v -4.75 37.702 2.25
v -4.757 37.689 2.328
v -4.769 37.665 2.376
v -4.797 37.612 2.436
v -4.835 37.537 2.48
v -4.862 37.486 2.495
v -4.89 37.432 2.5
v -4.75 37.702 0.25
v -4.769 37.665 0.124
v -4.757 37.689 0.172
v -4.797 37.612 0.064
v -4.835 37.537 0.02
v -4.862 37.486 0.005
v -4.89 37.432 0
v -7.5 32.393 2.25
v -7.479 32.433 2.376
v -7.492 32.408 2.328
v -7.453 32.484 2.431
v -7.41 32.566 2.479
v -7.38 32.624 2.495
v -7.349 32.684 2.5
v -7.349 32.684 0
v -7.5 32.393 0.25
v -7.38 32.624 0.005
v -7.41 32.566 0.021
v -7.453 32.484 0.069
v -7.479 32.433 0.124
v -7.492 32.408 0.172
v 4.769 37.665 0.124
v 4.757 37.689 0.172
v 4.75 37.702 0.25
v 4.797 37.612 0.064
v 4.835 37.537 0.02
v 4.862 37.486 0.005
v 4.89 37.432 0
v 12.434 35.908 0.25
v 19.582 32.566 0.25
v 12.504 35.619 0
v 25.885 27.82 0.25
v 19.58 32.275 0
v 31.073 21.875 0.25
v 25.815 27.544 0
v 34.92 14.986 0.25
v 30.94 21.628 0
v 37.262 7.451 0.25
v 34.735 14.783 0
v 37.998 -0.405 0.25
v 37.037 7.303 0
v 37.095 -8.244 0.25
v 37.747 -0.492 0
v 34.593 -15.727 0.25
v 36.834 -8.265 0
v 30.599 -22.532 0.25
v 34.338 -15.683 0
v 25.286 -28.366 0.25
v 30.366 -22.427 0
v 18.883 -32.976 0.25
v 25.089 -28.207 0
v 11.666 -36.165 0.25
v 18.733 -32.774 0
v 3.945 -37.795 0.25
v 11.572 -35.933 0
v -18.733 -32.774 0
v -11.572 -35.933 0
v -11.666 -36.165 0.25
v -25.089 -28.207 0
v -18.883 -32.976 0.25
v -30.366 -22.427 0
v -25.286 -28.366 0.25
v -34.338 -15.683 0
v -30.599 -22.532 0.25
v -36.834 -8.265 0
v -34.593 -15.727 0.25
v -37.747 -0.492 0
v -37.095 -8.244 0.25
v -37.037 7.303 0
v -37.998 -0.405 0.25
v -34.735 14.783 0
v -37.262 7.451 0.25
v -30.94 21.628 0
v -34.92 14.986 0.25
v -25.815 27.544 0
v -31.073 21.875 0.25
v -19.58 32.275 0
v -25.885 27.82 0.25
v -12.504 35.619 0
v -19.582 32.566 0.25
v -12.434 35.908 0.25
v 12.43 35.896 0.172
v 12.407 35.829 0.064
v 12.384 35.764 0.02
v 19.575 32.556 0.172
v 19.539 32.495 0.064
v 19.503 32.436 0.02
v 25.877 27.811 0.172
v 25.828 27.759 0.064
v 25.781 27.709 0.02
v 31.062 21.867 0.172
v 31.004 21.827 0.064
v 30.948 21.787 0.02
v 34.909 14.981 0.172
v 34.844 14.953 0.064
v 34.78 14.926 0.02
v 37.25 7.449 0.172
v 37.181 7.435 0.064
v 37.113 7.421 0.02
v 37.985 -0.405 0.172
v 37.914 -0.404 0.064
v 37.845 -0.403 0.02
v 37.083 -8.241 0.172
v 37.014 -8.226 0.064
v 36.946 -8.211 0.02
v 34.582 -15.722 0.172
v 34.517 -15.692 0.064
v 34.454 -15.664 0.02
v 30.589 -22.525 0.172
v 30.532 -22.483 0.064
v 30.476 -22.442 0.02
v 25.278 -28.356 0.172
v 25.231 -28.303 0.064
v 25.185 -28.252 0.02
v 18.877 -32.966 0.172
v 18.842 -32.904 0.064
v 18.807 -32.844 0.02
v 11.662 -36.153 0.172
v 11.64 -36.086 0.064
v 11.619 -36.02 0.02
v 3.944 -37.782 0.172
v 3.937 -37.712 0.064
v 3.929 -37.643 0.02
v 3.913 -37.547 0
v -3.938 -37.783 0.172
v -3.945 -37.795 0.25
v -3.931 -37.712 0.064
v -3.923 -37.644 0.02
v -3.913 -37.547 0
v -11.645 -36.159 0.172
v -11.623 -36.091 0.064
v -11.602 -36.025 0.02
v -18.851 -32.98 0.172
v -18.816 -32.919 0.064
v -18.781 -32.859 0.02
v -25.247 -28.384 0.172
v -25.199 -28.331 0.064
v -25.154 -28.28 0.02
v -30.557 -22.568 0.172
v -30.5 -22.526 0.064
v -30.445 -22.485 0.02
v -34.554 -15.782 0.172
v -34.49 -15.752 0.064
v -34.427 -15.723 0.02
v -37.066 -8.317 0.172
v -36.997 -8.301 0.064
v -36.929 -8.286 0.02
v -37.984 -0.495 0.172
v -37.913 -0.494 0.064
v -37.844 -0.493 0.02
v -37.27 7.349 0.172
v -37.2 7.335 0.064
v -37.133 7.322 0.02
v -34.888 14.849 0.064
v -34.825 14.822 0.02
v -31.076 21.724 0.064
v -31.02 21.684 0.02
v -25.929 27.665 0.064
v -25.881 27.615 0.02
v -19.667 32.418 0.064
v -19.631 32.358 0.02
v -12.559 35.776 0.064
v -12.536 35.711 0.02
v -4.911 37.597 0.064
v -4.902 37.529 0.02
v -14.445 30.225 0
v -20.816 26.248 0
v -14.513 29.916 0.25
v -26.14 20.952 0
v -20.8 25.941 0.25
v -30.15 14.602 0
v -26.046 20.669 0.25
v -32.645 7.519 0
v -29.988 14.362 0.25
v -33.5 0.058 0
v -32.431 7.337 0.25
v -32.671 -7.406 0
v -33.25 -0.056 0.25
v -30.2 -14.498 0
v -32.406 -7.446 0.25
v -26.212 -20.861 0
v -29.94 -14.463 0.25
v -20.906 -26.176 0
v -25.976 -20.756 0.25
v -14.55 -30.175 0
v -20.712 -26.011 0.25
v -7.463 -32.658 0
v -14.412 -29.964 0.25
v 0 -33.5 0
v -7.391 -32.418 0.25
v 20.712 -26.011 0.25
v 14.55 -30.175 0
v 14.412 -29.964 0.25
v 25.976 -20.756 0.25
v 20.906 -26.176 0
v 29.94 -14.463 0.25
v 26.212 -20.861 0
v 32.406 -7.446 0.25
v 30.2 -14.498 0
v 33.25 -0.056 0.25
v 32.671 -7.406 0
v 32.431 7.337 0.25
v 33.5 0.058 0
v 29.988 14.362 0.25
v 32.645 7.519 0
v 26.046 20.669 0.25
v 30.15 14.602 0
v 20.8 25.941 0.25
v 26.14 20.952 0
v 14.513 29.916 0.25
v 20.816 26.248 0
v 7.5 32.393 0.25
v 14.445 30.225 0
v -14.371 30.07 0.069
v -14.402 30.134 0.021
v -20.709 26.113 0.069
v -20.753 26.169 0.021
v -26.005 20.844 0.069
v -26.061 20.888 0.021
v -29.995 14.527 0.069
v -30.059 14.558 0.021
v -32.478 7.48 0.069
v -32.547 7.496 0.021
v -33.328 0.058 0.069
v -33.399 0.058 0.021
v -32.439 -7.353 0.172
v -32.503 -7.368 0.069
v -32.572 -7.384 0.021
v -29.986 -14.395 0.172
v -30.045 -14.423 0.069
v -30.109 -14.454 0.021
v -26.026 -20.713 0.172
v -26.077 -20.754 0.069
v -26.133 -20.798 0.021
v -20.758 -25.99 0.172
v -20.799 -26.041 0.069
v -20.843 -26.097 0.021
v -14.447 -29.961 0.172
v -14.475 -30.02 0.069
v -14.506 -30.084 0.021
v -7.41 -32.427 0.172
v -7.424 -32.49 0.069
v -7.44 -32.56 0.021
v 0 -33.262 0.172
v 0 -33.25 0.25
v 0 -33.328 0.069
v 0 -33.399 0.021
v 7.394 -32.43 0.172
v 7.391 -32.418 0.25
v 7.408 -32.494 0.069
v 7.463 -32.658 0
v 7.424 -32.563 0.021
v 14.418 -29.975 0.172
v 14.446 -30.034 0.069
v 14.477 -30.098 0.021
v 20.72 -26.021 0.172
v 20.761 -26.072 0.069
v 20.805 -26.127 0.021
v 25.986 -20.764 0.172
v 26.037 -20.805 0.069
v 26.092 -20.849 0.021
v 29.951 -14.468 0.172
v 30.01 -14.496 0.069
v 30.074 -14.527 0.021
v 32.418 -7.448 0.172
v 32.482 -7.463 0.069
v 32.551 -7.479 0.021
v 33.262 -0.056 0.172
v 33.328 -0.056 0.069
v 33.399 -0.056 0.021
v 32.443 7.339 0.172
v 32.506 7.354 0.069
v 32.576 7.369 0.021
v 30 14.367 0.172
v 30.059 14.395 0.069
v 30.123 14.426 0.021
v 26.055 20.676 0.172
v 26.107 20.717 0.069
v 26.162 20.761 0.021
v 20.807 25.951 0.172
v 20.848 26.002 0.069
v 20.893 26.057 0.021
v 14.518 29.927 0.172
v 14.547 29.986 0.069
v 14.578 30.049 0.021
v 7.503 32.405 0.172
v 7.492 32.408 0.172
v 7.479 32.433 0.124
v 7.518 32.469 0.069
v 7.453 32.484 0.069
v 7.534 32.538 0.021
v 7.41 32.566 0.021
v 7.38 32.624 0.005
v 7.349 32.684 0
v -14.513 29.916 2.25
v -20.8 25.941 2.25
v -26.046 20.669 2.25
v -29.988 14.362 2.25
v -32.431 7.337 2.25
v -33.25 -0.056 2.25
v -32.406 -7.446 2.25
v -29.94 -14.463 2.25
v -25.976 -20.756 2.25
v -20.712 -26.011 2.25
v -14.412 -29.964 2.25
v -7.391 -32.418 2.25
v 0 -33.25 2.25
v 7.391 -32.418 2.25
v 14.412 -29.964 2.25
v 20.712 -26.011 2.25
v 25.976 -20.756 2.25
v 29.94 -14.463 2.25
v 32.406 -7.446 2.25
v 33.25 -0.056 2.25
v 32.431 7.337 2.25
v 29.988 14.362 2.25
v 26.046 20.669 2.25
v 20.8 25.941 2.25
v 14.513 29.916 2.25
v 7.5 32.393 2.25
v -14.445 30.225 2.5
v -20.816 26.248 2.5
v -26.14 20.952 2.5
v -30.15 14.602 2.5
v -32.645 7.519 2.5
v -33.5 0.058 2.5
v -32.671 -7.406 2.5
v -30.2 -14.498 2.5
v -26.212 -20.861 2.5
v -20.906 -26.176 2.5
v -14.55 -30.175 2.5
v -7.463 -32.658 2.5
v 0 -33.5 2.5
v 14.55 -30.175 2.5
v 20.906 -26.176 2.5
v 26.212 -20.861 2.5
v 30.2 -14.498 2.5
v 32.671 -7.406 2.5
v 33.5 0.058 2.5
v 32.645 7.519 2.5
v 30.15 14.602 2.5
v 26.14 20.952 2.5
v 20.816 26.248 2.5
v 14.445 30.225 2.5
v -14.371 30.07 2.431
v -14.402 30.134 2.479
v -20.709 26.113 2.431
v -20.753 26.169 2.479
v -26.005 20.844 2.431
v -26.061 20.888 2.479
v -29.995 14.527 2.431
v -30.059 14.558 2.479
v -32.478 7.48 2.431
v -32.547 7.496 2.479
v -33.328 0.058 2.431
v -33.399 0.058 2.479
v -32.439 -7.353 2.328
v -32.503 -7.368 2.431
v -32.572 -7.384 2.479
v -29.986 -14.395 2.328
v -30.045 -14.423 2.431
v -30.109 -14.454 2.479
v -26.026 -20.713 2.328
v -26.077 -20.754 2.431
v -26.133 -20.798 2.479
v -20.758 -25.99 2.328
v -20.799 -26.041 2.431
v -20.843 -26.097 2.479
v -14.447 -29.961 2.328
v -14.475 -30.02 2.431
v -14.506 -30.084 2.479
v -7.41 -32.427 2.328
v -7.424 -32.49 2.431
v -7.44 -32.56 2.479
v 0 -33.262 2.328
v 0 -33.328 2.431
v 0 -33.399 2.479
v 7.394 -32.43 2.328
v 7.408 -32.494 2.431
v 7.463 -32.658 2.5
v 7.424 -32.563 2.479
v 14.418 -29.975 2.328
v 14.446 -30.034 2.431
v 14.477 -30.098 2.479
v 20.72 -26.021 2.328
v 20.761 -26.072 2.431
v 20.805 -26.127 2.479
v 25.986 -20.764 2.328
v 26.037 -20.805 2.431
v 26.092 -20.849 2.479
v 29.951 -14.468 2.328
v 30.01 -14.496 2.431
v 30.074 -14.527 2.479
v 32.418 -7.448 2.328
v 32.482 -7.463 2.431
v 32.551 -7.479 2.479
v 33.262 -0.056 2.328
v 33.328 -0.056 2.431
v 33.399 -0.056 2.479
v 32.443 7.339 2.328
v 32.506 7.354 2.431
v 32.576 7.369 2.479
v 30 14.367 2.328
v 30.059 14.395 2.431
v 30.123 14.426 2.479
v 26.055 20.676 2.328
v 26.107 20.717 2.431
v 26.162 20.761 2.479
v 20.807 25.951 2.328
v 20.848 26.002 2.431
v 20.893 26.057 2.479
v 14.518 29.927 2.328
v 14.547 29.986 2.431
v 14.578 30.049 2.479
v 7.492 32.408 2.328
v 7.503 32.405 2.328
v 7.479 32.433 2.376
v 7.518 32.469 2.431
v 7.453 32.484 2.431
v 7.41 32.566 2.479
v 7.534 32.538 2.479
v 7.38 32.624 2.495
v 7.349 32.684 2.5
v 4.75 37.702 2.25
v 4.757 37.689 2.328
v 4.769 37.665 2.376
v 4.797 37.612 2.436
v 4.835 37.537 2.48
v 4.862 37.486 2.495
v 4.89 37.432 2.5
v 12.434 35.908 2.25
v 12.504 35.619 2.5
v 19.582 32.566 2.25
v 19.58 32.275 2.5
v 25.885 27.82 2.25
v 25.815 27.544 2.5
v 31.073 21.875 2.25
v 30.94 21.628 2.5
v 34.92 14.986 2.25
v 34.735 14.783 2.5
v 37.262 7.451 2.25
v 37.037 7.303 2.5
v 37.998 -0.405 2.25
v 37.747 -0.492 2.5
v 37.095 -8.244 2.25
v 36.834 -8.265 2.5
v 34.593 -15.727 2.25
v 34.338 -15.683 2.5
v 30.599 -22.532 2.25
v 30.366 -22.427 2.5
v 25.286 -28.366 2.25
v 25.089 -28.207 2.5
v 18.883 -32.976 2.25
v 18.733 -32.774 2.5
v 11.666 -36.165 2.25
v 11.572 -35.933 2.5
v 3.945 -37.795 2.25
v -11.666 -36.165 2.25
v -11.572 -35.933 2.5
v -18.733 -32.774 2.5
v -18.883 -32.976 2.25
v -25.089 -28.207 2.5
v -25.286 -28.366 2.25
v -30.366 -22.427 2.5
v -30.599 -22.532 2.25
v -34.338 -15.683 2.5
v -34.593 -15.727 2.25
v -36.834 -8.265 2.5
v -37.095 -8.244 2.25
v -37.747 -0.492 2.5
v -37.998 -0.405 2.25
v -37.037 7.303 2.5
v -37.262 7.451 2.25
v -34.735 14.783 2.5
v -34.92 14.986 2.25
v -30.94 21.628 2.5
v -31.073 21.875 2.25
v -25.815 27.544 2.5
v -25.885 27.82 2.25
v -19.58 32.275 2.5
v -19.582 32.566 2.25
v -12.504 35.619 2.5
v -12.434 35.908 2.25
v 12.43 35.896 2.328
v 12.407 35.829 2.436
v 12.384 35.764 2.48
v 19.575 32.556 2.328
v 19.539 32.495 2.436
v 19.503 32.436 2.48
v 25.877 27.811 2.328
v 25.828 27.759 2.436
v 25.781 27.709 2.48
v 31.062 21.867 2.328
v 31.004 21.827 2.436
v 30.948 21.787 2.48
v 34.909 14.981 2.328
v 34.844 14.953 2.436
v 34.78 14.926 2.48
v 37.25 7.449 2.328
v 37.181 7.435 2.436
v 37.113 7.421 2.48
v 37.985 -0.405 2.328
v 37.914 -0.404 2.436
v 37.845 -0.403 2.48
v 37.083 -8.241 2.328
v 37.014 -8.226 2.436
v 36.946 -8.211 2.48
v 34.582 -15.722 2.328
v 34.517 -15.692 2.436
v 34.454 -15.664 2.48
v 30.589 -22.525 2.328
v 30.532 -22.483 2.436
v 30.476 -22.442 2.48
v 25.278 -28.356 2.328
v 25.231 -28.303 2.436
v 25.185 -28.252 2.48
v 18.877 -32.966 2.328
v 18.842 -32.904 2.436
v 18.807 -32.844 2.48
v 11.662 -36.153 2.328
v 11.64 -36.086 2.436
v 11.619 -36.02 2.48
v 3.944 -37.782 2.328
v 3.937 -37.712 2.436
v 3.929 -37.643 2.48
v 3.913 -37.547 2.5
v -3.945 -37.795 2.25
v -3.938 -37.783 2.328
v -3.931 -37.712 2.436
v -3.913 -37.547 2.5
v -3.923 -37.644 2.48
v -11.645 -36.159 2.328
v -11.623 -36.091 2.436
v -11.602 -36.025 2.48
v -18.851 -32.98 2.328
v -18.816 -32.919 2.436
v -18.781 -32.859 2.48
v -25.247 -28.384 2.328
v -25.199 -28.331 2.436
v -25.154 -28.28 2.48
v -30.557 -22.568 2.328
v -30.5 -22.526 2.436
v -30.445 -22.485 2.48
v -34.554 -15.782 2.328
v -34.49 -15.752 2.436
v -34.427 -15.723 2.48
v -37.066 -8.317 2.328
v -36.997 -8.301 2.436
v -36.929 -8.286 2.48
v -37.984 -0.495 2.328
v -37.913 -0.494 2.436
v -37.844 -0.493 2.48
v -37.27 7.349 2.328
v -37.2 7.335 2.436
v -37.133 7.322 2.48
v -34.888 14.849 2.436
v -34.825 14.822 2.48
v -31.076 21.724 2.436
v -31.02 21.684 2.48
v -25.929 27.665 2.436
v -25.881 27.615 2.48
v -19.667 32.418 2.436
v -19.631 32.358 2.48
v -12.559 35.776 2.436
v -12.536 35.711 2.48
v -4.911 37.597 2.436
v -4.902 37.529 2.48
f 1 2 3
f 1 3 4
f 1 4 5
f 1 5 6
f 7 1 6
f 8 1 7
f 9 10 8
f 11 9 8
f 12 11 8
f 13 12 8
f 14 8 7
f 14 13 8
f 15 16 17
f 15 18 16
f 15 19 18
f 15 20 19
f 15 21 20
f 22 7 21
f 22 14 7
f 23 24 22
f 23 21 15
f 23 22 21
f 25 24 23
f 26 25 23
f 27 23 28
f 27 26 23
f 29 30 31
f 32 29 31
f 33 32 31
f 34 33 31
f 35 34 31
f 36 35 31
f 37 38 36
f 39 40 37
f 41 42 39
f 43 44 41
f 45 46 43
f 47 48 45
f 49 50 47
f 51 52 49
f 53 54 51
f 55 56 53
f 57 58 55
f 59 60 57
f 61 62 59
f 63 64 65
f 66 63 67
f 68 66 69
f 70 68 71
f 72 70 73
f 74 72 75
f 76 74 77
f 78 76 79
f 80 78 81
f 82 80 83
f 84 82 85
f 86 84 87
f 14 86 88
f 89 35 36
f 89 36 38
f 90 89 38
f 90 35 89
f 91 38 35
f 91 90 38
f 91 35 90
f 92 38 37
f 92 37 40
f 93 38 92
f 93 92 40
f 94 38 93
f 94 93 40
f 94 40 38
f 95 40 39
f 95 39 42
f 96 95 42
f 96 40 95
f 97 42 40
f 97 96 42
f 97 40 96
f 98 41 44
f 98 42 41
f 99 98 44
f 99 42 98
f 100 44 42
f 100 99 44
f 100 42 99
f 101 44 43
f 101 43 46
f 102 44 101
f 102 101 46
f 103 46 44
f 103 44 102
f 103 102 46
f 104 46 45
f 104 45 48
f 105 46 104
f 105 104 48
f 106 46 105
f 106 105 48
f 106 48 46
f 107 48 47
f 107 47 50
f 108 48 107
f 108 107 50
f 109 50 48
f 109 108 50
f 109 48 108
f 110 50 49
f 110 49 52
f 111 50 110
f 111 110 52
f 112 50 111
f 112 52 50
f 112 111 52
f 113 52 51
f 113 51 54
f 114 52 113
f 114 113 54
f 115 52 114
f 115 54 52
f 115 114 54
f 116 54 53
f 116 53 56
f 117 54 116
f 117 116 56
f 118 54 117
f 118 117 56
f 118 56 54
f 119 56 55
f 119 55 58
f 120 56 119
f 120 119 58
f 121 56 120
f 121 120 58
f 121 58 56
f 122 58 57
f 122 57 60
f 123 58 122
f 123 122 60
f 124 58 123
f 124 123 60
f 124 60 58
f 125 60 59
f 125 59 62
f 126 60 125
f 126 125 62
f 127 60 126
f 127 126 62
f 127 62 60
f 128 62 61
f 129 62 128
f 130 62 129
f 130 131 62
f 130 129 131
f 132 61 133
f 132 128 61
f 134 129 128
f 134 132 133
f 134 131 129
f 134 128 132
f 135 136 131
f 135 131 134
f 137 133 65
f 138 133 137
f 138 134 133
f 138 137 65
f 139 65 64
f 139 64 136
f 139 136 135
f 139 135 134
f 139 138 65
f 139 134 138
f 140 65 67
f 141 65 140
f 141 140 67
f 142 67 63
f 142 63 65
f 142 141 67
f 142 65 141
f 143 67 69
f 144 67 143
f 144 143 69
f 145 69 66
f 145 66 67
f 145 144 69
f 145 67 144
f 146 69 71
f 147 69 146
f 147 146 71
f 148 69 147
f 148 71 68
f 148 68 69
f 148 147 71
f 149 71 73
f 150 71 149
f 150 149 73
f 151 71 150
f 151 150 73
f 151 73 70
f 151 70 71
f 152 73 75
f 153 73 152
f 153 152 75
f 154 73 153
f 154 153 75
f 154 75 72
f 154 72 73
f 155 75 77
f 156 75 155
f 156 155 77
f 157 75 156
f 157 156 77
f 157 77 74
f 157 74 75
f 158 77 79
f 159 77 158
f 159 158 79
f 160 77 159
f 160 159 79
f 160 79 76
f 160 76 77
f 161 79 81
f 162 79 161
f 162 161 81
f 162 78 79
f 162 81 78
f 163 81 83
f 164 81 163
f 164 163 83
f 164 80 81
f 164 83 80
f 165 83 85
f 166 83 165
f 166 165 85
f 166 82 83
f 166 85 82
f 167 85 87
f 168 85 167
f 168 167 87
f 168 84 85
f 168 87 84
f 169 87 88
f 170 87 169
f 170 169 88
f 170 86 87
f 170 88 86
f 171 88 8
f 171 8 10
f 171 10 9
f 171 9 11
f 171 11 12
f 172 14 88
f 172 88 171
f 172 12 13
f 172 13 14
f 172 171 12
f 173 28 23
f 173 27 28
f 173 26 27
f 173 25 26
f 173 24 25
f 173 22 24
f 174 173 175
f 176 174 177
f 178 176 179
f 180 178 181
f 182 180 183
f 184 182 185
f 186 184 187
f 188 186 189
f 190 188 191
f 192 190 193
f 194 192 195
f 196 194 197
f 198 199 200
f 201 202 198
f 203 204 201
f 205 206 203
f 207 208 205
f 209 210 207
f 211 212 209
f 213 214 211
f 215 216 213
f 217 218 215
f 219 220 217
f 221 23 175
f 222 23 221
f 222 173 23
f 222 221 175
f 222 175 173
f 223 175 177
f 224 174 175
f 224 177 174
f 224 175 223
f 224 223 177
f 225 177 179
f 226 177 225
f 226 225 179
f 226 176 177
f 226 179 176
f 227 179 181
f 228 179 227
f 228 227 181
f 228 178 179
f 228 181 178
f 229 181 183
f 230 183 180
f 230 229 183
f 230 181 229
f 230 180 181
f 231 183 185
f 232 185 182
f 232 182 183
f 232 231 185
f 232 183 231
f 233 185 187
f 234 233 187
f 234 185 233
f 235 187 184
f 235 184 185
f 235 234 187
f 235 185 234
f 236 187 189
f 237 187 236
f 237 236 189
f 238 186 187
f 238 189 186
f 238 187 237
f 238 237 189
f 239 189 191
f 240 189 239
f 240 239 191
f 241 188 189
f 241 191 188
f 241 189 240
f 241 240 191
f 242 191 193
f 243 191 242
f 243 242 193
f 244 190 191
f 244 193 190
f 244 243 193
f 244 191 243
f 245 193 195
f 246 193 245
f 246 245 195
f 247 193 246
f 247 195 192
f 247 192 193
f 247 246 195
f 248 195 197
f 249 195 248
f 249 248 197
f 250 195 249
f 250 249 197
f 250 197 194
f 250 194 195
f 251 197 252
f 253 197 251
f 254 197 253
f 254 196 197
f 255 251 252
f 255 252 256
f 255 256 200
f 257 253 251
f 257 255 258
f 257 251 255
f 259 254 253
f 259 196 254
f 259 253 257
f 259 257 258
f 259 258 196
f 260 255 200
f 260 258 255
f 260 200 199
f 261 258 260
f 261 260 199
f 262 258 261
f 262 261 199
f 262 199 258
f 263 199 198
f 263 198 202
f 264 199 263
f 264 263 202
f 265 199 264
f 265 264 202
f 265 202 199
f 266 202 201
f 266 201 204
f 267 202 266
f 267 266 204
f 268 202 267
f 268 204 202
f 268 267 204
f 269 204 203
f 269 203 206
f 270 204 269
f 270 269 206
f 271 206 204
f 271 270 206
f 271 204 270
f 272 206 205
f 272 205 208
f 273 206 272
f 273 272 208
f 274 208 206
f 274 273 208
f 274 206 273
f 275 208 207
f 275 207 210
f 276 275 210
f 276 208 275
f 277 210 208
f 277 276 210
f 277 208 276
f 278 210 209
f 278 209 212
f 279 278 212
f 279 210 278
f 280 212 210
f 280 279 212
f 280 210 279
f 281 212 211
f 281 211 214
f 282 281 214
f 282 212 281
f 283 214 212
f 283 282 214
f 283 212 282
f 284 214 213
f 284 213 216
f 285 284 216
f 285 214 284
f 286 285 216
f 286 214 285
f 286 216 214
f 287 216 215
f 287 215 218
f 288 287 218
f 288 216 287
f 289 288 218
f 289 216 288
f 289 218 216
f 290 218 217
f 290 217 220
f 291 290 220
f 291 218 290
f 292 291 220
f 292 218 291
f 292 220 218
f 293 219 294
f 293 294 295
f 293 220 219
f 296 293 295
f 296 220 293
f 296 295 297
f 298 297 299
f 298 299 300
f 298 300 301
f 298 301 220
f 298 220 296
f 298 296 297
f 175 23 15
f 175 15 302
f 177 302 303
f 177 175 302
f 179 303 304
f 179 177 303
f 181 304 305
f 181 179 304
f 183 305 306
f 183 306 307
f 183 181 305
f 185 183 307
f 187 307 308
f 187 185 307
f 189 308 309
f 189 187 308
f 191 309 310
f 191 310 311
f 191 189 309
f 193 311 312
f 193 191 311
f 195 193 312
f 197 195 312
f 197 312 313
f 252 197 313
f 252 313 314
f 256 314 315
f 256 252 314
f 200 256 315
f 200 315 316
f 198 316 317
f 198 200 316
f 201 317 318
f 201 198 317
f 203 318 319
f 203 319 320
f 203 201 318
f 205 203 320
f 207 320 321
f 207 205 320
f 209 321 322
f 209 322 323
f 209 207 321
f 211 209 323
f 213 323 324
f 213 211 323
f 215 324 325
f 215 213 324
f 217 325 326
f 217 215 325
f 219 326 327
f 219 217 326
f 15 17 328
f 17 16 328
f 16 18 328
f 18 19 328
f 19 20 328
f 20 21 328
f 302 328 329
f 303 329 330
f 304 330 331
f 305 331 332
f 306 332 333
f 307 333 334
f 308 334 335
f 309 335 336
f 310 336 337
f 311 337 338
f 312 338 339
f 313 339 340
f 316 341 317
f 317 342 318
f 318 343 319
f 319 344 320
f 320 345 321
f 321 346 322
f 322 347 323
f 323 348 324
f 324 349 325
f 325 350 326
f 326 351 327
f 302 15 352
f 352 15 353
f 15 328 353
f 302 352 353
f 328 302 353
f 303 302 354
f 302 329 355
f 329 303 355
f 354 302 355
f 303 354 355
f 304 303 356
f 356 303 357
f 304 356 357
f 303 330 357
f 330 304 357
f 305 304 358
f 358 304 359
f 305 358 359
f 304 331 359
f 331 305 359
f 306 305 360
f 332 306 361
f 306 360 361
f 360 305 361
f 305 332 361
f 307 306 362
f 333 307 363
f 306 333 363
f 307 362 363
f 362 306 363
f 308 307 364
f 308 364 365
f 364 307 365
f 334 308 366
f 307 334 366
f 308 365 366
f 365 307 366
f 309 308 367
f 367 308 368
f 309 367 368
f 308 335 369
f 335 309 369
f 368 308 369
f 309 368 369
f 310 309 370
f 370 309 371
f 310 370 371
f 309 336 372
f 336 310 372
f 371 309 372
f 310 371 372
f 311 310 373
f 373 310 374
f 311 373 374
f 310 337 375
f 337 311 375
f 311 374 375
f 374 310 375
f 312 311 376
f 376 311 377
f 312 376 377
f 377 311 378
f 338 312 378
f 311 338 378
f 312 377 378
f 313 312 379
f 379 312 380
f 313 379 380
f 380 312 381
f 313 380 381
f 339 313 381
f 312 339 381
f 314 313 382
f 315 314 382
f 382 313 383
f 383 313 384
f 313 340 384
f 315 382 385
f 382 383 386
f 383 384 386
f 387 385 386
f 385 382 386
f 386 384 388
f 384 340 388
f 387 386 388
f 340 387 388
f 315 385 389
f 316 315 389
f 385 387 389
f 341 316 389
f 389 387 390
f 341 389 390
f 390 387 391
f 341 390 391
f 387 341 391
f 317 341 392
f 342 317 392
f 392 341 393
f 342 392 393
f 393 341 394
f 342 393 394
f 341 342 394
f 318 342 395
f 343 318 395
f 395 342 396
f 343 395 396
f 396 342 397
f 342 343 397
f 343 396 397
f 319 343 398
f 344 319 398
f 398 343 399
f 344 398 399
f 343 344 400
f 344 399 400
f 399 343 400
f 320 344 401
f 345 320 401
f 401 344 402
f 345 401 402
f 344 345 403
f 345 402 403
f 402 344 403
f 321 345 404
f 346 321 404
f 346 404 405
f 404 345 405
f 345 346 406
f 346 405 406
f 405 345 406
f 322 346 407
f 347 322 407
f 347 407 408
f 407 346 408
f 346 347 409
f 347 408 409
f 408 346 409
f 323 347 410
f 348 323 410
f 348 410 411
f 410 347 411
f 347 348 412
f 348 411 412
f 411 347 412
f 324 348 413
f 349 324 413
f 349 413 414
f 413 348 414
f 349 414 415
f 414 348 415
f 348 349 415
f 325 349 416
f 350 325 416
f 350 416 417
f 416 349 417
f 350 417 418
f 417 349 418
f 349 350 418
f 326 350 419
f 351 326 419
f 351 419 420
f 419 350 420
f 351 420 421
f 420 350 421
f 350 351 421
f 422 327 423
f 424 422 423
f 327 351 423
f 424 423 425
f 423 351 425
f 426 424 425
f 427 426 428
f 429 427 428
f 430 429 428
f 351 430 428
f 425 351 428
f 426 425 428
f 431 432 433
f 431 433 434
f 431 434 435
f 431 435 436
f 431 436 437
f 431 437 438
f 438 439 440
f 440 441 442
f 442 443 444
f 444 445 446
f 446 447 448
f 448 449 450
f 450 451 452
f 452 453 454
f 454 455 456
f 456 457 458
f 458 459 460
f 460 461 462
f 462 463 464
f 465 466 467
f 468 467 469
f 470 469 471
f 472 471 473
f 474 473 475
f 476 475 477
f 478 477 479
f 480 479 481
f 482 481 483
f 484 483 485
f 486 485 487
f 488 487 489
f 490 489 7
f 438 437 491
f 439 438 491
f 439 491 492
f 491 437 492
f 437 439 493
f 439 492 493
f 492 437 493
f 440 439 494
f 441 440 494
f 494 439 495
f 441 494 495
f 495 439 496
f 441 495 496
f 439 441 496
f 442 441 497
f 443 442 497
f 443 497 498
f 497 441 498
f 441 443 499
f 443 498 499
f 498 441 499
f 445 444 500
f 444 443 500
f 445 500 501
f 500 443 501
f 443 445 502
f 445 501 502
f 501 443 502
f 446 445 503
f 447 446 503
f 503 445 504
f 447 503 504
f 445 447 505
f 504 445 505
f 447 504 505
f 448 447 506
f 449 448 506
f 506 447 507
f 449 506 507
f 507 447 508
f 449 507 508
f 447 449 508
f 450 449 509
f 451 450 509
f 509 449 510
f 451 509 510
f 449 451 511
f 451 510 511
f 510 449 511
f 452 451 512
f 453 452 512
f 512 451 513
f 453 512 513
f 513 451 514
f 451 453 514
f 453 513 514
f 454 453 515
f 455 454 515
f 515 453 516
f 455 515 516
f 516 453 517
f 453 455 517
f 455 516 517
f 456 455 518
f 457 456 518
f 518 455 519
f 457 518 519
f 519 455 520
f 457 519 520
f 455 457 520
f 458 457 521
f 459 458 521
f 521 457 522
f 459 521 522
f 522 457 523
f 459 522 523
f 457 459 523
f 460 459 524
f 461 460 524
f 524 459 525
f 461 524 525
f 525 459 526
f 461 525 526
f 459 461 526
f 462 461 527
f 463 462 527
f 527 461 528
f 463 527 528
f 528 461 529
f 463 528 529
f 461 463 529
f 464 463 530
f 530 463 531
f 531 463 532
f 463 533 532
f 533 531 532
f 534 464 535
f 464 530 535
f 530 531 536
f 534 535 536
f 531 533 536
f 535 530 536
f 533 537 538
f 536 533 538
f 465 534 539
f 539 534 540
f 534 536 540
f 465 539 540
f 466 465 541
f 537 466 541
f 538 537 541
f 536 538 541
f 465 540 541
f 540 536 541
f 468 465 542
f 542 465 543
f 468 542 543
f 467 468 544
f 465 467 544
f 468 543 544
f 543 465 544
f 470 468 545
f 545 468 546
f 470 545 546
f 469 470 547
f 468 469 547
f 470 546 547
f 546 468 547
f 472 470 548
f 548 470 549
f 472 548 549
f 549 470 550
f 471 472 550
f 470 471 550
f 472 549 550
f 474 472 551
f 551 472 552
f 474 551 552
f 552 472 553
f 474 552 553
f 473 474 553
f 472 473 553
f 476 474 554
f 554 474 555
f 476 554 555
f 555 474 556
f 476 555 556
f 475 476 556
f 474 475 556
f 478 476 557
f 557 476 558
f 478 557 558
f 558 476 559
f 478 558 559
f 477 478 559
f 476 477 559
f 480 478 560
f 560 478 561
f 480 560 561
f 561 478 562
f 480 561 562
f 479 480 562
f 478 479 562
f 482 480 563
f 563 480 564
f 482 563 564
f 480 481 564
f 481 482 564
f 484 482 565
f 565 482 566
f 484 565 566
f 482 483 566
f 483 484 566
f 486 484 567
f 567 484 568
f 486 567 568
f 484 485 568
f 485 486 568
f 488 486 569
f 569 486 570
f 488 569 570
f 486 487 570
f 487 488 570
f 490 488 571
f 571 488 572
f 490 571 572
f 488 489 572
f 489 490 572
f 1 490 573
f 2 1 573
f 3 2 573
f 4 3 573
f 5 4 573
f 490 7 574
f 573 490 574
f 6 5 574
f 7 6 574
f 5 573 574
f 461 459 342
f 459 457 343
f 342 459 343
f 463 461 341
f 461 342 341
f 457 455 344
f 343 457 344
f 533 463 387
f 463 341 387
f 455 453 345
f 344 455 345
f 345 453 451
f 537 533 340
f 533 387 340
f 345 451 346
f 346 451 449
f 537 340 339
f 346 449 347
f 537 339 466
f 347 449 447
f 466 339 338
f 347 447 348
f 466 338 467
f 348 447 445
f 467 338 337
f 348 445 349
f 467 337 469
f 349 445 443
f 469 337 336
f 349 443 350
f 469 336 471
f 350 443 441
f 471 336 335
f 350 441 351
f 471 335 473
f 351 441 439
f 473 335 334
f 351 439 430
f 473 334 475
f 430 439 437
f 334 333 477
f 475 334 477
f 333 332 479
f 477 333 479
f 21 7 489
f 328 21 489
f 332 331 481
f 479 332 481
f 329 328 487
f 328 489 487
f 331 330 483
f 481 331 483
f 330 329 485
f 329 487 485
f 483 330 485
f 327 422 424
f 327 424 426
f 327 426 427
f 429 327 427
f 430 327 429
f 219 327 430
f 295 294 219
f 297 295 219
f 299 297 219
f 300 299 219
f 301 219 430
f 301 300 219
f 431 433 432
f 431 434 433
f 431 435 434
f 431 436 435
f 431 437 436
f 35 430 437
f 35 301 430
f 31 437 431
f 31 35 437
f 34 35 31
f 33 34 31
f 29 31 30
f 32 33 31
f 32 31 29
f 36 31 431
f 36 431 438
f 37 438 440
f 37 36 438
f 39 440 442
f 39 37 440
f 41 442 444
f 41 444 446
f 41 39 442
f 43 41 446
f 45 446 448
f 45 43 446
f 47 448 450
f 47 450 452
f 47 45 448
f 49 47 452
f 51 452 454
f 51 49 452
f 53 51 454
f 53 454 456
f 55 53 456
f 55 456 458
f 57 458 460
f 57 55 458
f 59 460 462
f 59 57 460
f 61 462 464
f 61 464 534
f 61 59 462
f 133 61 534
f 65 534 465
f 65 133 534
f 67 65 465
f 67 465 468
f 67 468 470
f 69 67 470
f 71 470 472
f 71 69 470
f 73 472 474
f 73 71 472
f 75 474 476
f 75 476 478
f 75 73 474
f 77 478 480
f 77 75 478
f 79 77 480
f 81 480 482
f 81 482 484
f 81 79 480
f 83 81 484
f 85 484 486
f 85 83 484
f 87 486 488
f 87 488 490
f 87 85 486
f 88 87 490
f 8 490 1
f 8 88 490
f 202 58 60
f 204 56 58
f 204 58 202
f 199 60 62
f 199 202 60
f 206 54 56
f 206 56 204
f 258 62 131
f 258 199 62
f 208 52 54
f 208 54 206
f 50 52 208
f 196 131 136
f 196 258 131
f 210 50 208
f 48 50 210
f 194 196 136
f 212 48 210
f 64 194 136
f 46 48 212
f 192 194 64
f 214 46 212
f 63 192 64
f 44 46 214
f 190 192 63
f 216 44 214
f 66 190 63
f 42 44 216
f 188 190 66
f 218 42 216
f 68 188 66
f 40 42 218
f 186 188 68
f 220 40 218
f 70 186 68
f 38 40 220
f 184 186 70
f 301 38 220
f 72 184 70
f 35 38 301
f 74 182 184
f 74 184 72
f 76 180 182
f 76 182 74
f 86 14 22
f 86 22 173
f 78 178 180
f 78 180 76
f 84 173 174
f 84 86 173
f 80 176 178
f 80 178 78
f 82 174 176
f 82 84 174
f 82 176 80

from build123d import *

# Parameters (mm, degrees)
RESSALTO_EXTRUS_O1_DEPTH = 2.5
FILETE1_R                = 0.25


with BuildPart() as part:
    # Esboço1 → Ressalto-extrusão1 (new body)
    with BuildSketch(Plane.XY):
        with BuildLine():
            Line((-4.75, 37.701956183), (-7.5, 32.3930934))
            ThreePointArc((-7.5, 32.3930934), (0, -33.25), (7.5, 32.3930934))
            Line((7.5, 32.3930934), (4.75, 37.701956183))
            ThreePointArc((4.75, 37.701956183), (0, -38), (-4.75, 37.701956183))
        make_face()
    extrude(amount=RESSALTO_EXTRUS_O1_DEPTH)

    # Filete1
    filete1_edges = [part.edges().sort_by_distance(p)[0] for p in [
        (0, -38, 2.5),
        (0, -33.25, 2.5),
        (0, -38, 0),
        (0, -33.25, 0),
    ]]
    fillet(filete1_edges, radius=FILETE1_R)


solid = part.part
